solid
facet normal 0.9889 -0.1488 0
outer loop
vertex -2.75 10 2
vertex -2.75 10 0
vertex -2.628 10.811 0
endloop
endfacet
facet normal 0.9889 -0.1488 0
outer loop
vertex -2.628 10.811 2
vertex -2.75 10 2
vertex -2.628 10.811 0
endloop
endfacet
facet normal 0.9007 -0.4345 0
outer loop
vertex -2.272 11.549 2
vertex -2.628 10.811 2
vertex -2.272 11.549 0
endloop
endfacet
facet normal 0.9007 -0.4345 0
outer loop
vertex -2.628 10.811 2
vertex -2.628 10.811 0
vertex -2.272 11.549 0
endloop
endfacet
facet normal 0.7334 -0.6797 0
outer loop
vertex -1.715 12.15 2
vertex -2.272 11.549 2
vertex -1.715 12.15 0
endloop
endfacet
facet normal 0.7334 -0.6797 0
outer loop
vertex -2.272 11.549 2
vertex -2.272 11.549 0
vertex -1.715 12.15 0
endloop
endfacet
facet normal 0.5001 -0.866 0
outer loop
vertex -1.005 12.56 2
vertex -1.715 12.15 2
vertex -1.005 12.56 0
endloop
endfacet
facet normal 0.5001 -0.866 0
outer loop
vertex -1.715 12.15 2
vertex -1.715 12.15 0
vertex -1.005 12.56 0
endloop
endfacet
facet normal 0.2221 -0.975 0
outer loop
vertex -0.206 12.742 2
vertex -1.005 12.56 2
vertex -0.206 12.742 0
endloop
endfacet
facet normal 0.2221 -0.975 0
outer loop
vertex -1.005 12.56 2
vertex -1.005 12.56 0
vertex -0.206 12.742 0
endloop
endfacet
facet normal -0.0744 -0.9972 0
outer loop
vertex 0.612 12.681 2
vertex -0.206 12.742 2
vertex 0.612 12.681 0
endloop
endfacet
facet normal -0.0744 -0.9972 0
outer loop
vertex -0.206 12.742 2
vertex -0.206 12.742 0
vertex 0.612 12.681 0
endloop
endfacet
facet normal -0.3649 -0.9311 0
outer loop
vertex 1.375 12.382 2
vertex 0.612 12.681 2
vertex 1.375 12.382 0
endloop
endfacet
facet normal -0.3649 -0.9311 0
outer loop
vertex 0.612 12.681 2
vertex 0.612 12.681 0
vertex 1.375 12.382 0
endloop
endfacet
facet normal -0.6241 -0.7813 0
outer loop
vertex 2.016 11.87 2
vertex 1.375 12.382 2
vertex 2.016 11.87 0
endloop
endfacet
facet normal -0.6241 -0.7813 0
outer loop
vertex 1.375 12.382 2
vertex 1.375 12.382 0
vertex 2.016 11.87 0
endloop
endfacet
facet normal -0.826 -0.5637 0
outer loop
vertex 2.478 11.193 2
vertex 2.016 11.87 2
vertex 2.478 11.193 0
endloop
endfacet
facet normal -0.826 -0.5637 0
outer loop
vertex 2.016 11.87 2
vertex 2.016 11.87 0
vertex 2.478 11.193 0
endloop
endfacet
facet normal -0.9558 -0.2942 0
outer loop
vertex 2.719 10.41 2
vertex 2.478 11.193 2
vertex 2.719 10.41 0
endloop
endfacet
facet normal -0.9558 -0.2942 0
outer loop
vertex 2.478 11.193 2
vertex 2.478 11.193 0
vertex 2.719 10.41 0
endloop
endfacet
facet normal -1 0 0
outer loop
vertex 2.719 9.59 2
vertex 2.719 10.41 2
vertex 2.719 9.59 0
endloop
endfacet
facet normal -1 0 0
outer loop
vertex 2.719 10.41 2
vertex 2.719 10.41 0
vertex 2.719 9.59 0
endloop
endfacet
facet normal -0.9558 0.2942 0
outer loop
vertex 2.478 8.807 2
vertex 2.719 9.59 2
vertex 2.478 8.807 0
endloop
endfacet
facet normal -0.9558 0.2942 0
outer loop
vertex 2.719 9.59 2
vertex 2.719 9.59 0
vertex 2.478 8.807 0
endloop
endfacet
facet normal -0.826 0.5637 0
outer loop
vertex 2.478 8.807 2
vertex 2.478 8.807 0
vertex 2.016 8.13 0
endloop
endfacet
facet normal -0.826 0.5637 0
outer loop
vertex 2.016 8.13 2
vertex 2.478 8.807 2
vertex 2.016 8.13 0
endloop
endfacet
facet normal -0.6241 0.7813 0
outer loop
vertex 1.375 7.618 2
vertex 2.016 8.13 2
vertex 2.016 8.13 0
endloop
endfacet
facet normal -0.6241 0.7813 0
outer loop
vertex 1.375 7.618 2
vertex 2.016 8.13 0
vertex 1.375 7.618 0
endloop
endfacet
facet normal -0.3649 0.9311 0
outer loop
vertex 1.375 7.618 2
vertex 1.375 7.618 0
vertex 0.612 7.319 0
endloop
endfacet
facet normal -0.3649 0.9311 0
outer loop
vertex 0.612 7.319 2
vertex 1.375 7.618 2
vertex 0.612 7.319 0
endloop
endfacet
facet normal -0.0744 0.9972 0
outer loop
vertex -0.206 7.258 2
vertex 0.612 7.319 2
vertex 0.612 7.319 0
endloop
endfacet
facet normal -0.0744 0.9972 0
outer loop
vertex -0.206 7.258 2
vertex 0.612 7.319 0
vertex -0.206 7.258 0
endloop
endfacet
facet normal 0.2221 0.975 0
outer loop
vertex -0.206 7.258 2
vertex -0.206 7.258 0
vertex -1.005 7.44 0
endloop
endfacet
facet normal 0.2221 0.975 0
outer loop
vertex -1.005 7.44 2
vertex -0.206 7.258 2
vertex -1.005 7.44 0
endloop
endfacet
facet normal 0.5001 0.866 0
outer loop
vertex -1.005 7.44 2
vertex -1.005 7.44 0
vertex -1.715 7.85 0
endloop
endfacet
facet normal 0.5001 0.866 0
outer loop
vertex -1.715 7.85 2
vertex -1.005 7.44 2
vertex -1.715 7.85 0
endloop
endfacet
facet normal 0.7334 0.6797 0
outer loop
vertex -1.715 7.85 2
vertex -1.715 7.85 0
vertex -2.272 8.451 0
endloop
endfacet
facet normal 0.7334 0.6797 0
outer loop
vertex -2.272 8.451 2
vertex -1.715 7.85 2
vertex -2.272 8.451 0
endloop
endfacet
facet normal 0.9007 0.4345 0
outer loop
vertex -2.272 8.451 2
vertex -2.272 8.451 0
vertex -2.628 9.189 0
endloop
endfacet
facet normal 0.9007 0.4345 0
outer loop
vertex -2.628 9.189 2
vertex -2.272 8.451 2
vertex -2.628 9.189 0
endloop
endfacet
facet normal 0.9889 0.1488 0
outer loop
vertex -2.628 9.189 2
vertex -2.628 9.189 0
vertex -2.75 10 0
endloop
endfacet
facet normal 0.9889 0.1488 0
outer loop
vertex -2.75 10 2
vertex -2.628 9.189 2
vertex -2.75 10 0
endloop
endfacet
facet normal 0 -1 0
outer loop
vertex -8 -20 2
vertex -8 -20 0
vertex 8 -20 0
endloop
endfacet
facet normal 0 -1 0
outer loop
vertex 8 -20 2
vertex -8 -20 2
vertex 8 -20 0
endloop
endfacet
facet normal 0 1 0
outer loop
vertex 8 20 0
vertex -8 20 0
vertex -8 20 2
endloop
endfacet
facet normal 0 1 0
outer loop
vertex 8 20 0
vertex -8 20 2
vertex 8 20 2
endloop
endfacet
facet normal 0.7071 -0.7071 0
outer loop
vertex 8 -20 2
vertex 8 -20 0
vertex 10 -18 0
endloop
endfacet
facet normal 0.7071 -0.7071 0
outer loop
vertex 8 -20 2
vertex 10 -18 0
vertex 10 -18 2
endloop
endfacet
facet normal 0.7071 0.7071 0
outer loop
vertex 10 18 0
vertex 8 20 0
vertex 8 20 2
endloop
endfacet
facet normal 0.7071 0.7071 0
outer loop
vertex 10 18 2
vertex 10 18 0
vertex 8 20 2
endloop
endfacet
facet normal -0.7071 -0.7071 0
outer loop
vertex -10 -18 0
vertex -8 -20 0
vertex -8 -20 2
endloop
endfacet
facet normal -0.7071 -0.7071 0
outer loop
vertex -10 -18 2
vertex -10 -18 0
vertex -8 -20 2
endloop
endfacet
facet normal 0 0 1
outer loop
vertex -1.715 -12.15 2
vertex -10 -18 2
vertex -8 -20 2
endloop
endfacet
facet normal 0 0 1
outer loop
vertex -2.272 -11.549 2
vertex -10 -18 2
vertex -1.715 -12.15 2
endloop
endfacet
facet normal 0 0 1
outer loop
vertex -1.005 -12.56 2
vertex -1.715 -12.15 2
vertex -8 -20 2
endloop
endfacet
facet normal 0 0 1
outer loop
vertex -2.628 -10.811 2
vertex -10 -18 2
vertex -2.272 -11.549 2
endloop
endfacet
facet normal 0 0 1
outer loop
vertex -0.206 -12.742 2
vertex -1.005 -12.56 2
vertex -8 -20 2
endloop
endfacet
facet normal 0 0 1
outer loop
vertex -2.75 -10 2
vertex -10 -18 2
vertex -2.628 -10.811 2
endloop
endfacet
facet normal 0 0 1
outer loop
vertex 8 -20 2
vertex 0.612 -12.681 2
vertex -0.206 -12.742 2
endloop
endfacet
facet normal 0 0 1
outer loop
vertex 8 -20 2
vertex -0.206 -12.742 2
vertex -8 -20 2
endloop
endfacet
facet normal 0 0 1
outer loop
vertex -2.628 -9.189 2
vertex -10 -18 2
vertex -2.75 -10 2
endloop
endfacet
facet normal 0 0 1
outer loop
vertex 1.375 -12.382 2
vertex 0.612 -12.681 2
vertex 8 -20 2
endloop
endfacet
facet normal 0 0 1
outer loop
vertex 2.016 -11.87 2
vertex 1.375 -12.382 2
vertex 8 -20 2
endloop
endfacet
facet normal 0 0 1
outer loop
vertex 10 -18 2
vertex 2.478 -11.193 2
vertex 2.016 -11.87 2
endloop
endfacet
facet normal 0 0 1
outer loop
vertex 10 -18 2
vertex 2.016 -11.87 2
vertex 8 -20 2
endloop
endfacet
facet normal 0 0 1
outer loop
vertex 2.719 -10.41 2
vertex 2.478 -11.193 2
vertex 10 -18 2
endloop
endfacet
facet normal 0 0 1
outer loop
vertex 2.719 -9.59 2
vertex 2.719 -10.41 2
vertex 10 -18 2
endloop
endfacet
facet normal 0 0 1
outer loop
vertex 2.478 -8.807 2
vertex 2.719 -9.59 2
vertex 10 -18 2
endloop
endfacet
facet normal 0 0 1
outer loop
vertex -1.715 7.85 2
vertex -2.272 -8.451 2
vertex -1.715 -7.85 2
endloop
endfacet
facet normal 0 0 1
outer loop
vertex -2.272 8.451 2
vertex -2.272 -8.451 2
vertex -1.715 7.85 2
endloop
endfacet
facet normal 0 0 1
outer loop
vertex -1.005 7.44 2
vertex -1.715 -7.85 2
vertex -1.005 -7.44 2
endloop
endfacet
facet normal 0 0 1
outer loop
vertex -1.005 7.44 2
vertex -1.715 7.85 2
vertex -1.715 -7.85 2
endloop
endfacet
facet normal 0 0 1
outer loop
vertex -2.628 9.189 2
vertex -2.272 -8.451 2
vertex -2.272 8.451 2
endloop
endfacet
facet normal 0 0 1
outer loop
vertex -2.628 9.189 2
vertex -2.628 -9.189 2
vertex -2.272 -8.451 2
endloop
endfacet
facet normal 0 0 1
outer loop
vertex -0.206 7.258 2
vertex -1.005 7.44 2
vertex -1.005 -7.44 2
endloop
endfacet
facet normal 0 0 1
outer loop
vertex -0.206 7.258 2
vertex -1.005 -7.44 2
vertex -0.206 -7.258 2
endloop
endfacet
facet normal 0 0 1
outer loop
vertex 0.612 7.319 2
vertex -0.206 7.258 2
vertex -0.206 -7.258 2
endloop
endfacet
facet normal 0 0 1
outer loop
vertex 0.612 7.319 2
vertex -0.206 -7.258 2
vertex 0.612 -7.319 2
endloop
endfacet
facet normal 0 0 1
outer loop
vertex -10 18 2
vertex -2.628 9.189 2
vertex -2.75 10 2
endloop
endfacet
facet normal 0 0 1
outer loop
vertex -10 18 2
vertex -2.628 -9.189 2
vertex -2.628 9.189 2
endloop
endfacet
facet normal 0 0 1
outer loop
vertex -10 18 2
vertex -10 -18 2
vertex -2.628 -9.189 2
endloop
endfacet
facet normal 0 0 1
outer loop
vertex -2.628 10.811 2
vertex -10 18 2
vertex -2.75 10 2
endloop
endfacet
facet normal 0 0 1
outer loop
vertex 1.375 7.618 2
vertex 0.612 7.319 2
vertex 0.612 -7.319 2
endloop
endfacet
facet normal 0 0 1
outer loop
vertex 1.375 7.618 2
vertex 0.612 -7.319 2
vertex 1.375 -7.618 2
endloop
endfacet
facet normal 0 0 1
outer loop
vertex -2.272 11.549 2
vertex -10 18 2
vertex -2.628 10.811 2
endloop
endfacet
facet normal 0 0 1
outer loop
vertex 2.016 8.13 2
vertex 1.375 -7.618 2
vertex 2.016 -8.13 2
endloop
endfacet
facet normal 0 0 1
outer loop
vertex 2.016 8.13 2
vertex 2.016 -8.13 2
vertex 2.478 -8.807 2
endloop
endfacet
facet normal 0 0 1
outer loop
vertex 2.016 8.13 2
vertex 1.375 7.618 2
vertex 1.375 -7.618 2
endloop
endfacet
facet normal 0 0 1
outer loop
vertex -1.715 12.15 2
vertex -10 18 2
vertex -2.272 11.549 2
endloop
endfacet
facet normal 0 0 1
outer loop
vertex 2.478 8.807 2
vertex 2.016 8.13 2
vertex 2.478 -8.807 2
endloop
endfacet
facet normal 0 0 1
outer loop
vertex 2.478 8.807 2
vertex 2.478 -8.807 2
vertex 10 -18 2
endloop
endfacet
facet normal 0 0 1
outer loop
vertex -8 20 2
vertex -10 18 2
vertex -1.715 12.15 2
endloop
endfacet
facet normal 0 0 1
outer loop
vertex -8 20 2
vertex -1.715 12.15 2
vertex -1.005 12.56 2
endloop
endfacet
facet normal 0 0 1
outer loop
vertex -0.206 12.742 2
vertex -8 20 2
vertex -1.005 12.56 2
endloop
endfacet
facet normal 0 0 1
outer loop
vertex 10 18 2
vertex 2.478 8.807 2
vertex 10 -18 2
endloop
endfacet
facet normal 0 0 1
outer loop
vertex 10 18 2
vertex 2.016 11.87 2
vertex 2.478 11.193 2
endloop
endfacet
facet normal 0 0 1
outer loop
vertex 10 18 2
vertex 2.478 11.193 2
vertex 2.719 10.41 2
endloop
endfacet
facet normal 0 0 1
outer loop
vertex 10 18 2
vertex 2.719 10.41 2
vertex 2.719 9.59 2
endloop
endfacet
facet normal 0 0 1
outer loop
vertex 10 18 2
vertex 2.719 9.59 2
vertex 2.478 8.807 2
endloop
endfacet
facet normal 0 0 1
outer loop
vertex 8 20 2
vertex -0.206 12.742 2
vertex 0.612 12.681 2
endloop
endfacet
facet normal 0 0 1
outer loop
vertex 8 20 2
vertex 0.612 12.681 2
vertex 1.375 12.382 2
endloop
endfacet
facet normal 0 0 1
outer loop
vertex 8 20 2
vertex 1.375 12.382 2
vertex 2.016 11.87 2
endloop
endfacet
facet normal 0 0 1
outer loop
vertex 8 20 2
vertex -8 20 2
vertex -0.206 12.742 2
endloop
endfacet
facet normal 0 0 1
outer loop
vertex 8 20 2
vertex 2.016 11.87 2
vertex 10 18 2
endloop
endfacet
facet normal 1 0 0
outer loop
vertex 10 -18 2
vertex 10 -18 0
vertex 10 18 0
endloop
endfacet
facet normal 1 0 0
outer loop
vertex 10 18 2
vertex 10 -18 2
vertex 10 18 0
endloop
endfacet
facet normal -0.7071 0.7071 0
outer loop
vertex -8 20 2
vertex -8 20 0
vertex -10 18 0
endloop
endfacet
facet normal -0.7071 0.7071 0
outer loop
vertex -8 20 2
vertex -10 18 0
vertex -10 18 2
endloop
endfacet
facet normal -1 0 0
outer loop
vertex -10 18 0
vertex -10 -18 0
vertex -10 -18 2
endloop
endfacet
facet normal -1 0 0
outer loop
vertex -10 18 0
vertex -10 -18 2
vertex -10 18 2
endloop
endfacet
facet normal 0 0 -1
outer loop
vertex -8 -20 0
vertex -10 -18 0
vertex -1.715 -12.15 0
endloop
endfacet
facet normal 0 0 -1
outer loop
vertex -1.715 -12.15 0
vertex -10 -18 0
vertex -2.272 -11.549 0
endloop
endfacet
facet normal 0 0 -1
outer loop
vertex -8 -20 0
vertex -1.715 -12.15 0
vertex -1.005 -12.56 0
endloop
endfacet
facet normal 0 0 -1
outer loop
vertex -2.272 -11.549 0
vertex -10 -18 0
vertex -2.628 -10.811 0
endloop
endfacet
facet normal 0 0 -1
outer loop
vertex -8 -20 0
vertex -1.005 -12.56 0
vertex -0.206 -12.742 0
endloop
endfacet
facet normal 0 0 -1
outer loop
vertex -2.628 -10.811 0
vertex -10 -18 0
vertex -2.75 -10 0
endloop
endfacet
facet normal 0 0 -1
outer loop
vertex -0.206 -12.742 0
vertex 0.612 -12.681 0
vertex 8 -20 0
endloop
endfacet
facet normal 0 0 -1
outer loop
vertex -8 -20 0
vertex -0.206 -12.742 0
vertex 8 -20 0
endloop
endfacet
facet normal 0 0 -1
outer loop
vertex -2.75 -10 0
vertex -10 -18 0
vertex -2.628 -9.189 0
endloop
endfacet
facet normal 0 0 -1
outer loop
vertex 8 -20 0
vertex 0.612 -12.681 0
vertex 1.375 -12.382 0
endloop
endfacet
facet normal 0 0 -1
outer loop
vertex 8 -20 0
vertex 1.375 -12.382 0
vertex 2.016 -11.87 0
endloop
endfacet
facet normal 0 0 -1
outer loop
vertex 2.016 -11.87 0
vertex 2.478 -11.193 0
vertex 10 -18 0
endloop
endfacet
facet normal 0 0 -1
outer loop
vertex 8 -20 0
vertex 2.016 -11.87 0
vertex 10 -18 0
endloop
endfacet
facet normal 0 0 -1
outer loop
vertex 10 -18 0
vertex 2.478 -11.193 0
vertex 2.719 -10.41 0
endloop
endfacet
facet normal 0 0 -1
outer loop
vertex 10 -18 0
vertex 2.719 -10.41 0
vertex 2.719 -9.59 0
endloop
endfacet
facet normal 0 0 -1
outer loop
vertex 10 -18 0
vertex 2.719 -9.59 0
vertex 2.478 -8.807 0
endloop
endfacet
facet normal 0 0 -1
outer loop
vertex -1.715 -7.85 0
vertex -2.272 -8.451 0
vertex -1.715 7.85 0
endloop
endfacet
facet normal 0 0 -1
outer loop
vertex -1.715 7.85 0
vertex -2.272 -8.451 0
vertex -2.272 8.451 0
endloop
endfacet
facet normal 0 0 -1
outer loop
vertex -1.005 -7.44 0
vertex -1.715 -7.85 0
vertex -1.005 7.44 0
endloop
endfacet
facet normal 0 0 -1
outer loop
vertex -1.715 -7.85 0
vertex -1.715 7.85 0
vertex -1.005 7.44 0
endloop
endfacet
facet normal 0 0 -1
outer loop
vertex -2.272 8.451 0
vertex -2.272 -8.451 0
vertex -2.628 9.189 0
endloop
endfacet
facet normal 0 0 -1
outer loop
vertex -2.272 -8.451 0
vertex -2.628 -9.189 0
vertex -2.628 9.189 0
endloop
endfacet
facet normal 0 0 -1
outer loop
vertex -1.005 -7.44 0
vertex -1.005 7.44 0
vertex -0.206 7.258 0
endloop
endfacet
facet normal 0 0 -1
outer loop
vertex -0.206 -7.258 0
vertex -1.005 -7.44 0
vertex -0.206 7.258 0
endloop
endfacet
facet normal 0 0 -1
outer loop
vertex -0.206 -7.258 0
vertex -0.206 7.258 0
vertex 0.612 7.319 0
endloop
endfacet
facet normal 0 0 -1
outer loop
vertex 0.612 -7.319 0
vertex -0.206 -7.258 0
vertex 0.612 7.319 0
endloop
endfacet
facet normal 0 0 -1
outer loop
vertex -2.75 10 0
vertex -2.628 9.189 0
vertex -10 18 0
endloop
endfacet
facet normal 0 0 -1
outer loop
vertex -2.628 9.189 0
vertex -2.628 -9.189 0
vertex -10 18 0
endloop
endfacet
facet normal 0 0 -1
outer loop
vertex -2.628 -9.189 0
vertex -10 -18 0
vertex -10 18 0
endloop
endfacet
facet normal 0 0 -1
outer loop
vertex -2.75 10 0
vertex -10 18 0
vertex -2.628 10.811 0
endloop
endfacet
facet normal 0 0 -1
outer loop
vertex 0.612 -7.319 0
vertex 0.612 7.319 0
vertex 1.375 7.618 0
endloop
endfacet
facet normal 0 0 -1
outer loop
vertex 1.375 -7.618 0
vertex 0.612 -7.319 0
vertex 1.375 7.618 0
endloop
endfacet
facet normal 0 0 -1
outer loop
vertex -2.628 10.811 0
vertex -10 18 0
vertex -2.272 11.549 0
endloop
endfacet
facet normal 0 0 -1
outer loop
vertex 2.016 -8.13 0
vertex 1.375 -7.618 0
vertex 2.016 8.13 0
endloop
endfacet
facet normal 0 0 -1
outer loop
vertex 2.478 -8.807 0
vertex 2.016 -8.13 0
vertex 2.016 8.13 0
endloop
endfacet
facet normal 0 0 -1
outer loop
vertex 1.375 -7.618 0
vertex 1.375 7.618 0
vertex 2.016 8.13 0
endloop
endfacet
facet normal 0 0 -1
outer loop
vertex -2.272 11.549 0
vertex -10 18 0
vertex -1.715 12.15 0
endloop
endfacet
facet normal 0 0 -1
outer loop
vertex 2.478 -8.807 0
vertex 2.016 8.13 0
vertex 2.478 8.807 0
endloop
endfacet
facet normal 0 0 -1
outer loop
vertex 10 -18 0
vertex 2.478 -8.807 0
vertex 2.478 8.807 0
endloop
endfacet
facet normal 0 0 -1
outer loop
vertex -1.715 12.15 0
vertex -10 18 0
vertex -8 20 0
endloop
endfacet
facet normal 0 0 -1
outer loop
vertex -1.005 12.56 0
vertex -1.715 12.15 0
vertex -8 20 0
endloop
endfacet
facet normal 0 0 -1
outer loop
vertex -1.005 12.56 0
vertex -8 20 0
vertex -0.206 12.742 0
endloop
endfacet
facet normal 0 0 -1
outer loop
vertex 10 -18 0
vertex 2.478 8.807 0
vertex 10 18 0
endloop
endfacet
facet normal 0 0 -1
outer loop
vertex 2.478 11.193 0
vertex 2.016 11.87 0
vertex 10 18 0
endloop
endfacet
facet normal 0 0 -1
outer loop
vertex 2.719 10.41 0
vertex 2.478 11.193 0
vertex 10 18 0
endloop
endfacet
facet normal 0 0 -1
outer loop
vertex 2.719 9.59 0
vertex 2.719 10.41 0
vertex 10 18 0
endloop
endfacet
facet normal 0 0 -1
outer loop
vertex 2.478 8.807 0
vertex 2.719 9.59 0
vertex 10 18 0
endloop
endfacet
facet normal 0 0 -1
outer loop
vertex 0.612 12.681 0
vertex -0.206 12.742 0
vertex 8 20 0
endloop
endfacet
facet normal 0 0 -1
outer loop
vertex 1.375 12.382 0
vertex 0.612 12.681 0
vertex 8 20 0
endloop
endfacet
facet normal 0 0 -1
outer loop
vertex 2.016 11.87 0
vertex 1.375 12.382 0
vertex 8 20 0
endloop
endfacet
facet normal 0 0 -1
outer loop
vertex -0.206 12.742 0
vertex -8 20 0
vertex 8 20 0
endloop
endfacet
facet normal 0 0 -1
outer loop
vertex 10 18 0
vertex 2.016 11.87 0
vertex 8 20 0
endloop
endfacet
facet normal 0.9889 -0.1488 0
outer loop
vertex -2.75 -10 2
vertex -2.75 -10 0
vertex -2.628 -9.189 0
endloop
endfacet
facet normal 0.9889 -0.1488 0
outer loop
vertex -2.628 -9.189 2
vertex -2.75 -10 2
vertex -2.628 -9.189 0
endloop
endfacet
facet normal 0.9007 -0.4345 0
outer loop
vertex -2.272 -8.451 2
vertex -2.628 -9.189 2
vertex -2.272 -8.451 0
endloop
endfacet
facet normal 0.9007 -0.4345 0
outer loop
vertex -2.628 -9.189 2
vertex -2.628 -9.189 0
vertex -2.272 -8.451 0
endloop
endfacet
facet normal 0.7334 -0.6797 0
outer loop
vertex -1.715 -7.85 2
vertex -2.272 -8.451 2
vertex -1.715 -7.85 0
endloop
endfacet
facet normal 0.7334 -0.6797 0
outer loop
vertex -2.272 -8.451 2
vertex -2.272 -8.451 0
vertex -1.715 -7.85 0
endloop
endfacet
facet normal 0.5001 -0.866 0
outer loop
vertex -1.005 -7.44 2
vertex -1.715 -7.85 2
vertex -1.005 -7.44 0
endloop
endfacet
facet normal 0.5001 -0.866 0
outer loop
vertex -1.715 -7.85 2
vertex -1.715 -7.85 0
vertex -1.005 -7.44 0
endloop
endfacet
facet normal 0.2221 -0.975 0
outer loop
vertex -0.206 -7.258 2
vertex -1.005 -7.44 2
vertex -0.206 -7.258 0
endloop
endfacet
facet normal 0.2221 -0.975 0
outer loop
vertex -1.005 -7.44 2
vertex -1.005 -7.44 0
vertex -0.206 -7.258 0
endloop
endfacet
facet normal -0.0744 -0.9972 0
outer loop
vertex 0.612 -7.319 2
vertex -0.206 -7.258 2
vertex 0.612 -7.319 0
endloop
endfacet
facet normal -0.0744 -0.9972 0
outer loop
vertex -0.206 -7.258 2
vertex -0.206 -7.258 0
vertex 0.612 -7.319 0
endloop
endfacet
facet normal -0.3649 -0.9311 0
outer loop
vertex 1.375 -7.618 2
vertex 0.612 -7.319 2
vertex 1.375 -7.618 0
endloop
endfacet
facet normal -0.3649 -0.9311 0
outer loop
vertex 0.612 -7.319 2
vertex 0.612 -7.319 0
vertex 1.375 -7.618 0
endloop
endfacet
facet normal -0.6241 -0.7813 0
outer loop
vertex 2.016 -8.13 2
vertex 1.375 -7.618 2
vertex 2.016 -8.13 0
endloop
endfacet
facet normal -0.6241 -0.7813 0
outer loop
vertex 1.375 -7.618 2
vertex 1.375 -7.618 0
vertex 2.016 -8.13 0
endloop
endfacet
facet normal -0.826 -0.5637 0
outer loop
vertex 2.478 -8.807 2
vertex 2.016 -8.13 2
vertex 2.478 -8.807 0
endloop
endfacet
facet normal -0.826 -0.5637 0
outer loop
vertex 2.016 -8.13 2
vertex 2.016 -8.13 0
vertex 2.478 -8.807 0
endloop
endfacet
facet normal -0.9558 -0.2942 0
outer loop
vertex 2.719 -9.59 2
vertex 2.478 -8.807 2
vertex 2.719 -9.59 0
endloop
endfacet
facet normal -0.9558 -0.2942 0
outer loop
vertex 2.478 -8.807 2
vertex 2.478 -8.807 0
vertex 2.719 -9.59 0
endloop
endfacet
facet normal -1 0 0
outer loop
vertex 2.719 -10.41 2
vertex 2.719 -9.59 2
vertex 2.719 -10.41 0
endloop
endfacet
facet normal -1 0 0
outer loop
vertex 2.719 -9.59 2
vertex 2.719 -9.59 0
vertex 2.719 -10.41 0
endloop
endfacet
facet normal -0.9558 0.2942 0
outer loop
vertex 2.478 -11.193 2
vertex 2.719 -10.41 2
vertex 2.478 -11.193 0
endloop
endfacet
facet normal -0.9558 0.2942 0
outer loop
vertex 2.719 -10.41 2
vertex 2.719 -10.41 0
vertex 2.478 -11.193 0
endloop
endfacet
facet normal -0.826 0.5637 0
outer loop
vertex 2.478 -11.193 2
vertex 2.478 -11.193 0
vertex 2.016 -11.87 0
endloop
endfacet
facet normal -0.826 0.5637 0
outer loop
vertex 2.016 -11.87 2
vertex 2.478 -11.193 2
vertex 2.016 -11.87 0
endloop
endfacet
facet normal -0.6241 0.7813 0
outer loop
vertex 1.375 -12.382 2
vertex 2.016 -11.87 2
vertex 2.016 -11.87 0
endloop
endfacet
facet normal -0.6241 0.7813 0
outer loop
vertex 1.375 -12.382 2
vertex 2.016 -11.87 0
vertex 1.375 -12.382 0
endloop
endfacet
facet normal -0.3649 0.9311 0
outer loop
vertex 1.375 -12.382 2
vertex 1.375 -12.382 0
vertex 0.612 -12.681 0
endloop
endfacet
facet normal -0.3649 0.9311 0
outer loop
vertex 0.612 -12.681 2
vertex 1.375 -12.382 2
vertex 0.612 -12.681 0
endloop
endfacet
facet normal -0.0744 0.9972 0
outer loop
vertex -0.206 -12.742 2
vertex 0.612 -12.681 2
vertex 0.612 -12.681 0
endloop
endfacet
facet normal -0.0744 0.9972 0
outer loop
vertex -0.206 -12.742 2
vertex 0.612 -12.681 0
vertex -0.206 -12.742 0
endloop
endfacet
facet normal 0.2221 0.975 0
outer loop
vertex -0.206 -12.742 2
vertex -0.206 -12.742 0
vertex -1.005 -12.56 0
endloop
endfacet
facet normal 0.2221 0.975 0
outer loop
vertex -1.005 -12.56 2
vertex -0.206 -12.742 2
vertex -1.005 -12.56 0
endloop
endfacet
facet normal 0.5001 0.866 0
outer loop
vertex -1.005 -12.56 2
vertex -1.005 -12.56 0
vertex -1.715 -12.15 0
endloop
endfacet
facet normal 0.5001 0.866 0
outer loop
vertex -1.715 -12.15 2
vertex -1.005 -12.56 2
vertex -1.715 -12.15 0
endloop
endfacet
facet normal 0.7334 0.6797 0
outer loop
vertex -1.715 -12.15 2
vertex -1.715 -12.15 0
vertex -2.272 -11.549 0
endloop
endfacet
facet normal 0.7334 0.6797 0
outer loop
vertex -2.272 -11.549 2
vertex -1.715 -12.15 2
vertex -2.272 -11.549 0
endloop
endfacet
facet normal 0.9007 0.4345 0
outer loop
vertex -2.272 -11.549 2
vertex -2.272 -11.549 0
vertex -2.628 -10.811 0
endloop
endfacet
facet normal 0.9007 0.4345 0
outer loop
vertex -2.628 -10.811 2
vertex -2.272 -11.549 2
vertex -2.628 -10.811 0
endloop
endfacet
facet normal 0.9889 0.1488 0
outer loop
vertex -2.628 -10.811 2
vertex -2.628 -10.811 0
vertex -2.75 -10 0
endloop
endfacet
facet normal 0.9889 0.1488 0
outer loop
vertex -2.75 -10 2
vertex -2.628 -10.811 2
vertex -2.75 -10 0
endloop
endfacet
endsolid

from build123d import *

# Parameters (mm, degrees)
SKETCH_1_W        = 20
SKETCH_1_H        = 40
EXTRUDE_1_DEPTH   = 2
CHAMFER_1_SIZE    = 2
HOLE_WIZARD_M51_D = 5.5


with BuildPart() as part:
    # Эскиз1 → Бобышка-Вытянуть1 (new body)
    with BuildSketch(Plane.XY):
        Rectangle(SKETCH_1_W, SKETCH_1_H)
    extrude(amount=EXTRUDE_1_DEPTH)

    # Фаска1
    chamfer_1_edges = [part.edges().sort_by_distance(p)[0] for p in [
        (10, -20, 1),
        (-10, -20, 1),
        (-10, 20, 1),
        (10, 20, 1),
    ]]
    chamfer(chamfer_1_edges, length=CHAMFER_1_SIZE)

    # Отверстие с зазором M51 (through all)
    with Locations(Plane.XY.offset(2)):
        with Locations((0, -30), (0, 30), (0, 10), (0, -10)):
            Hole(HOLE_WIZARD_M51_D / 2)


solid = part.part
